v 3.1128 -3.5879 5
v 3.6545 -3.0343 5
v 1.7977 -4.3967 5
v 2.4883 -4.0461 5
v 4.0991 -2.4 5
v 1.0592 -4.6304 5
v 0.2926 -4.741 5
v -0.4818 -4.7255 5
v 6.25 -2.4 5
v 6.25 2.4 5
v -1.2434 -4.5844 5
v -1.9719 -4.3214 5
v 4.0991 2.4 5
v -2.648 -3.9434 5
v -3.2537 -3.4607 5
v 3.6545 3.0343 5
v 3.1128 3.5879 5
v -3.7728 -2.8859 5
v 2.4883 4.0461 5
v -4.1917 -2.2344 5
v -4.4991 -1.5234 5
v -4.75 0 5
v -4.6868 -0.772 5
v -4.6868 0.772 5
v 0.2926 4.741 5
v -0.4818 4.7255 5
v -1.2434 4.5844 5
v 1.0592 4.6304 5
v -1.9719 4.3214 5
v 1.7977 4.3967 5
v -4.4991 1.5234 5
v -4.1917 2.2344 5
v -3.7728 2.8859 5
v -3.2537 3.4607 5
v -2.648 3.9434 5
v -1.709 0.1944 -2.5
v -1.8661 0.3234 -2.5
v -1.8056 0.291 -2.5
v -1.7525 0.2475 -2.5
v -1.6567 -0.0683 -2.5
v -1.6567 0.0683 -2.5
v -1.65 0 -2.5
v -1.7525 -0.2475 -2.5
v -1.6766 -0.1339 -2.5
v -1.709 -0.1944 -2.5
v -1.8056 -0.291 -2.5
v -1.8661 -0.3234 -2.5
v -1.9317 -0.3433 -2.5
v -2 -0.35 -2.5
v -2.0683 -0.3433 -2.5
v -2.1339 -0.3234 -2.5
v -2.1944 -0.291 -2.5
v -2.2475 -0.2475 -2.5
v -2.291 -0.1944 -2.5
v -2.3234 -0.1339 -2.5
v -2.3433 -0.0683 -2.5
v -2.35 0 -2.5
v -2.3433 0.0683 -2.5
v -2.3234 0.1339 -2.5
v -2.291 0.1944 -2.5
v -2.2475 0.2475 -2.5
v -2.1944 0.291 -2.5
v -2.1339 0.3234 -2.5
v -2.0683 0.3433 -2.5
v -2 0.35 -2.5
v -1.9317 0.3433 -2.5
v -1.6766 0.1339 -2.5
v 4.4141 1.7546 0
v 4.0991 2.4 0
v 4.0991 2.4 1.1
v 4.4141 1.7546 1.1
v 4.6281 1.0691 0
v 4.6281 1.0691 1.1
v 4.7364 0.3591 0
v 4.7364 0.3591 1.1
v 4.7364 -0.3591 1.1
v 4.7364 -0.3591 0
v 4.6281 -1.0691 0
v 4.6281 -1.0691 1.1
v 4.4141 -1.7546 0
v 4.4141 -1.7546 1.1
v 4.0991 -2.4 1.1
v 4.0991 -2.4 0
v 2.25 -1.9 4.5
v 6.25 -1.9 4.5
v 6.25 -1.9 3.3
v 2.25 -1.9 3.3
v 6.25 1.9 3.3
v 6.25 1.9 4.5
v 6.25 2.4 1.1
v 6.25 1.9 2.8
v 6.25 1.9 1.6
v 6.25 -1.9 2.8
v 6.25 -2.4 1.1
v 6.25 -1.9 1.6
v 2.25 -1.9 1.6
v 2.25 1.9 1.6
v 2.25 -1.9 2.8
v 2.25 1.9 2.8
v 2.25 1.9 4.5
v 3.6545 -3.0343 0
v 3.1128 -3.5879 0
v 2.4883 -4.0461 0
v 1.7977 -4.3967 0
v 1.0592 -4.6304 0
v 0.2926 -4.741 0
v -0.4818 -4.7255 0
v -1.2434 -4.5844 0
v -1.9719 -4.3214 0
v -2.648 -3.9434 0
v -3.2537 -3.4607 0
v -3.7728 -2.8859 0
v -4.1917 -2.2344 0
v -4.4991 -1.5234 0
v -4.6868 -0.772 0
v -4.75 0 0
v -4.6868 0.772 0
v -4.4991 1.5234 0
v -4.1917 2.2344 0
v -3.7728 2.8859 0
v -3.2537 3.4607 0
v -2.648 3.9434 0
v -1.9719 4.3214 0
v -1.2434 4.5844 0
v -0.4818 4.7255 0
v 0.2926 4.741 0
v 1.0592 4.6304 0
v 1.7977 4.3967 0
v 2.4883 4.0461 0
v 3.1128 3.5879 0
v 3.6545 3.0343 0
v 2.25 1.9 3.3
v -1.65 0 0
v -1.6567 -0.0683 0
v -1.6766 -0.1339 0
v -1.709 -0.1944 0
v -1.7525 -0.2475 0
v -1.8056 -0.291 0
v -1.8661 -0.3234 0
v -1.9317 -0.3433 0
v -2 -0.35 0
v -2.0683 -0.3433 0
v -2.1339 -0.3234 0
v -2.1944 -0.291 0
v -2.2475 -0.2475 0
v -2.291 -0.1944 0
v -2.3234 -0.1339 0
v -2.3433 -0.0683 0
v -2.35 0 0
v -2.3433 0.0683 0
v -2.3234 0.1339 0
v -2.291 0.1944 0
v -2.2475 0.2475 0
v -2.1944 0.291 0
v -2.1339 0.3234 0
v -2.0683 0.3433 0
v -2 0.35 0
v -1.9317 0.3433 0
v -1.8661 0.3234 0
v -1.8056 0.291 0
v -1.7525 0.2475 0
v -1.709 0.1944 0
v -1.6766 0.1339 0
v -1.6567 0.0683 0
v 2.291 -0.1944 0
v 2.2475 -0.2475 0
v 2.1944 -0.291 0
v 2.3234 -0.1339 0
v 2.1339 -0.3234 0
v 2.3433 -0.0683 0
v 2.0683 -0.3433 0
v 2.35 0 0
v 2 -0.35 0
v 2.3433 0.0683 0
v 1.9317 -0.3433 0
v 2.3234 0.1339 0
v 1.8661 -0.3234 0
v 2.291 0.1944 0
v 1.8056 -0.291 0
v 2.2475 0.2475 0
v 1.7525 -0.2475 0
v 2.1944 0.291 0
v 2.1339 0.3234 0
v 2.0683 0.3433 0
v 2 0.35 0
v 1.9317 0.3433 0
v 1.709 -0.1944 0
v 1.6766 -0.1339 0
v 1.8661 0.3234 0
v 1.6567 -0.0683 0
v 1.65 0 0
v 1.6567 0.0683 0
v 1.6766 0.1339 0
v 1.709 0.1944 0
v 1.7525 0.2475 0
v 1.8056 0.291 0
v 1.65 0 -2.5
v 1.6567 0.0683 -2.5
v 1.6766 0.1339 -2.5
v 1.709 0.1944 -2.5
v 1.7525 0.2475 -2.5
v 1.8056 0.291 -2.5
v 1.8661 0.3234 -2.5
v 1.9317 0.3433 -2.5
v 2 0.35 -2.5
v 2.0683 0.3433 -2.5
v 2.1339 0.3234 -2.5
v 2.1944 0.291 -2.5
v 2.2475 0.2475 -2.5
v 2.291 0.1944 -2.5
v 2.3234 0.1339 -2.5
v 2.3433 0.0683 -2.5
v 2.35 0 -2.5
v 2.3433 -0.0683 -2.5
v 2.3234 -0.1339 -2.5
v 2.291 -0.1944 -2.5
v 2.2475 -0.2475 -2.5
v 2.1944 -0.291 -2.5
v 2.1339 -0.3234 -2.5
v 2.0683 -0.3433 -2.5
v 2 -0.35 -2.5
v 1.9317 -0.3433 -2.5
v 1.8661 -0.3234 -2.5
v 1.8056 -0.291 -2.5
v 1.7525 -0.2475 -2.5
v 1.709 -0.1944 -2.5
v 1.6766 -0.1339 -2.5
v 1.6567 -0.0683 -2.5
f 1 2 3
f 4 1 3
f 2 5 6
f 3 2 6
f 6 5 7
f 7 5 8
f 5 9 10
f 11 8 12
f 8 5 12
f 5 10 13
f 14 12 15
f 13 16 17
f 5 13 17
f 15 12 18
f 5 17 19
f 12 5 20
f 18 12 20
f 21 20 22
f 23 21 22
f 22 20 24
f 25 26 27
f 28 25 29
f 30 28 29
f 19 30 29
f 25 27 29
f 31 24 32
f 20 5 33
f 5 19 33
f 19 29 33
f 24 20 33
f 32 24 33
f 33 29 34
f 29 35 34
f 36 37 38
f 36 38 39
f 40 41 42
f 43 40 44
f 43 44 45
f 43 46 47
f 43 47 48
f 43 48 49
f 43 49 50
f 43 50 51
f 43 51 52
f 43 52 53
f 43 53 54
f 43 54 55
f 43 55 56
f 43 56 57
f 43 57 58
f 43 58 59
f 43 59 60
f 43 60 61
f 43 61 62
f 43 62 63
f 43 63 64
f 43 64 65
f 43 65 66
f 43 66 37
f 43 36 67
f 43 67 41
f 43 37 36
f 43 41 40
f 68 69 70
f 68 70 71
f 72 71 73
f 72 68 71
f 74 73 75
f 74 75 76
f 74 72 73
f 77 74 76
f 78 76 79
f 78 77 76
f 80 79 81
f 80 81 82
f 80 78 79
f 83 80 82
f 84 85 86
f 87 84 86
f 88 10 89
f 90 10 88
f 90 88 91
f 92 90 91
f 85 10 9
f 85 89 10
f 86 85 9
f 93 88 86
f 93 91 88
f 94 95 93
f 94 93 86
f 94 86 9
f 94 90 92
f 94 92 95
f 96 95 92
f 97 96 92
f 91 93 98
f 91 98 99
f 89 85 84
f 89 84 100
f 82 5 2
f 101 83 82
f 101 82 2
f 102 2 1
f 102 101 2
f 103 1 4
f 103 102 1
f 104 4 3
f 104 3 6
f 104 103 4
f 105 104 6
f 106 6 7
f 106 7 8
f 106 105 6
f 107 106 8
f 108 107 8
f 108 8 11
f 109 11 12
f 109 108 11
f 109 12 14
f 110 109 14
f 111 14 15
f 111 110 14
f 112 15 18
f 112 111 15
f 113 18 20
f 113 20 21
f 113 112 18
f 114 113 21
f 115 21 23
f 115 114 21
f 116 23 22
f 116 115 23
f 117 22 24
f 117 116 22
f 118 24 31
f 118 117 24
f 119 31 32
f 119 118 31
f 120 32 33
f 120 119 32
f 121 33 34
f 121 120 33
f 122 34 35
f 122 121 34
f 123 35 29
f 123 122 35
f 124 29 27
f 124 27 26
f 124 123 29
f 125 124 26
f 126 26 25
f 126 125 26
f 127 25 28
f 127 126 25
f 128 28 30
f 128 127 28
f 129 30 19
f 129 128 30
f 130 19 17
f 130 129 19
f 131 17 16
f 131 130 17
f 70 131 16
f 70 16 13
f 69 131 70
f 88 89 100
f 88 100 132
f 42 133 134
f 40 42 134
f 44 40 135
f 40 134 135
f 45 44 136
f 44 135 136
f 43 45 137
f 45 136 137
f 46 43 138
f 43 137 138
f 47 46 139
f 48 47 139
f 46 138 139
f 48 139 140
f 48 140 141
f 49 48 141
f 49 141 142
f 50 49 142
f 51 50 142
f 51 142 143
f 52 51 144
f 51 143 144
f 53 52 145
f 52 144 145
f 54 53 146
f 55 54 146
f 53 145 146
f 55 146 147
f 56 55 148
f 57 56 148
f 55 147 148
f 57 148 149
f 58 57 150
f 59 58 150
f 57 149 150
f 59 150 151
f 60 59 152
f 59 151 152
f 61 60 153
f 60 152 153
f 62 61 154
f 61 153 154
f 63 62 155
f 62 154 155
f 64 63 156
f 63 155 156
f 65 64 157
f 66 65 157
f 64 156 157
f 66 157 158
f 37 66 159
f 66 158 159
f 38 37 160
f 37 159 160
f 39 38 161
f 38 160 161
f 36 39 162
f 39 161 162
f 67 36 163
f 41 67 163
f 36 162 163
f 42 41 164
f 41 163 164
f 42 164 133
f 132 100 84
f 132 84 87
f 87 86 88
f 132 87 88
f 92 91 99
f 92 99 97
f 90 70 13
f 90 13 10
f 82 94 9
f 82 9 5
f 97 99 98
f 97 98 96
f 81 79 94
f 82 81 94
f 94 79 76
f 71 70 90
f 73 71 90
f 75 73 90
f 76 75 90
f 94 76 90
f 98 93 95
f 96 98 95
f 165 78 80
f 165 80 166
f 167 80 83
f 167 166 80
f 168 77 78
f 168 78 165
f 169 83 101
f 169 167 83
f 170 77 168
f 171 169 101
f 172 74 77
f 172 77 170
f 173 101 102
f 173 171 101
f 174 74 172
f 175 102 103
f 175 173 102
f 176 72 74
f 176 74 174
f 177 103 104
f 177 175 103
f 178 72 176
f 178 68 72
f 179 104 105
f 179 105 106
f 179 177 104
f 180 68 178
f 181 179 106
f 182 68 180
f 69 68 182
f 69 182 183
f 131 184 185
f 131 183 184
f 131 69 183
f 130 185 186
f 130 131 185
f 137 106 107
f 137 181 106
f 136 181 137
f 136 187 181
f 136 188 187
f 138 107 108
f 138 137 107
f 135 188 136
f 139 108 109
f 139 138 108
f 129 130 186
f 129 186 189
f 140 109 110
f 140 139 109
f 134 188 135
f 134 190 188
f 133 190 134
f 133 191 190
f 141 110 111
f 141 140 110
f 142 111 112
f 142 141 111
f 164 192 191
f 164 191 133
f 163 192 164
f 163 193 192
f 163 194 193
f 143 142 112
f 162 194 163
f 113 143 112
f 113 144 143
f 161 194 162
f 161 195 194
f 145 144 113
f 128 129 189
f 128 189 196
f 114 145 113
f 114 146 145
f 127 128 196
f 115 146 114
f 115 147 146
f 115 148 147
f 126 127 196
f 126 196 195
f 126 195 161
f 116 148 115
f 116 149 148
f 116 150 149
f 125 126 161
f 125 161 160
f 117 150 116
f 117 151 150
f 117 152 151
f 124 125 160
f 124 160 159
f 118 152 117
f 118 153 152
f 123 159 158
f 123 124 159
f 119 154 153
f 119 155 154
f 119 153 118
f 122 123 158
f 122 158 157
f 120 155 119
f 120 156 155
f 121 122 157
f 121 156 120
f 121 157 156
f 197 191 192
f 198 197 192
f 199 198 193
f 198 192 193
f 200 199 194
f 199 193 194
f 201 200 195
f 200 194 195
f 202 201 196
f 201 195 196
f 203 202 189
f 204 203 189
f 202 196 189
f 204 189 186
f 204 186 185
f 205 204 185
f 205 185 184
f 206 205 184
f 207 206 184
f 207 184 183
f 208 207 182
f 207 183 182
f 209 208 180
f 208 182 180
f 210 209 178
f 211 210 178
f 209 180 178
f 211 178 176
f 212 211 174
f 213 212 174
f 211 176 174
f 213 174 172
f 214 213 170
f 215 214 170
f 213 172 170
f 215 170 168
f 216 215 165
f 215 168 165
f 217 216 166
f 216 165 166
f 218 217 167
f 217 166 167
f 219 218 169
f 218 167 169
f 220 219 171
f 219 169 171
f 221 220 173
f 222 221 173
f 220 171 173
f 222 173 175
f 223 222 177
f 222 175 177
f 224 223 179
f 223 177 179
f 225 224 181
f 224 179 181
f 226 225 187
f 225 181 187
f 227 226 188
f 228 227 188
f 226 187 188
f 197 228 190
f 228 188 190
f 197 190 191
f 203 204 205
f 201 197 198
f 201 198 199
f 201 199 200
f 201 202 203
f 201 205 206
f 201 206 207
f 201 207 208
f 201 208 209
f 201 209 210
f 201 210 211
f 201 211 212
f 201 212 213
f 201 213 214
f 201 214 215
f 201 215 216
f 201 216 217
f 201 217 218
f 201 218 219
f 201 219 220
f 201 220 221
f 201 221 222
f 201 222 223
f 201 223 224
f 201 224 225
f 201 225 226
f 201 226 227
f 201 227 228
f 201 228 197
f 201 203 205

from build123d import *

# Parameters (mm, degrees)
BOSS_EXTRUDE1_DEPTH = 5
CUT_EXTRUDE1_DEPTH  = 1.1
SKETCH3_W           = 1.2
SKETCH3_H           = 3.8
CUT_EXTRUDE2_DEPTH  = 4
SKETCH4_R           = 0.35
BOSS_EXTRUDE2_DEPTH = 2.5


with BuildPart() as part:
    # Sketch1 → Boss-Extrude1 (new body)
    with BuildSketch(Plane.XY):
        with BuildLine():
            Line((4.099085264, 2.4), (6.25, 2.4))
            Line((6.25, 2.4), (6.25, -2.4))
            Line((6.25, -2.4), (4.099085264, -2.4))
            ThreePointArc((4.099085264, -2.4), (-4.75, 0), (4.099085264, 2.4))
        make_face()
    extrude(amount=BOSS_EXTRUDE1_DEPTH)

    # Sketch2 → Cut-Extrude1 (cut)
    with BuildSketch(Plane(origin=(0, 0, 0), x_dir=(-1, 0, 0), z_dir=(0, 0, -1))):
        with BuildLine():
            Line((-4.099085264, -2.4), (-6.25, -2.4))
            Line((-6.25, -2.4), (-6.25, 2.4))
            Line((-6.25, 2.4), (-4.099085264, 2.4))
            ThreePointArc((-4.099085264, 2.4), (-4.75, 0), (-4.099085264, -2.4))
        make_face()
    extrude(amount=-CUT_EXTRUDE1_DEPTH, mode=Mode.SUBTRACT)

    # Sketch3 → Cut-Extrude2 (cut)
    with BuildSketch(Plane(origin=(6.25, 0, 0), x_dir=(0, 0, -1), z_dir=(1, 0, 0))):
        with Locations((-3.9, 0)):
            Rectangle(SKETCH3_W, SKETCH3_H)
        with Locations((-2.2, 0)):
            Rectangle(SKETCH3_W, SKETCH3_H)
    extrude(amount=-CUT_EXTRUDE2_DEPTH, mode=Mode.SUBTRACT)

    # Sketch4 → Boss-Extrude2 (add)
    with BuildSketch(Plane(origin=(0, 0, 0), x_dir=(-1, 0, 0), z_dir=(0, 0, -1))):
        with Locations((-2, 0)):
            Circle(SKETCH4_R)
        with Locations(Location((2, 0, 0), (0, 0, 180))):
            Circle(SKETCH4_R)
    extrude(amount=BOSS_EXTRUDE2_DEPTH)


solid = part.part
